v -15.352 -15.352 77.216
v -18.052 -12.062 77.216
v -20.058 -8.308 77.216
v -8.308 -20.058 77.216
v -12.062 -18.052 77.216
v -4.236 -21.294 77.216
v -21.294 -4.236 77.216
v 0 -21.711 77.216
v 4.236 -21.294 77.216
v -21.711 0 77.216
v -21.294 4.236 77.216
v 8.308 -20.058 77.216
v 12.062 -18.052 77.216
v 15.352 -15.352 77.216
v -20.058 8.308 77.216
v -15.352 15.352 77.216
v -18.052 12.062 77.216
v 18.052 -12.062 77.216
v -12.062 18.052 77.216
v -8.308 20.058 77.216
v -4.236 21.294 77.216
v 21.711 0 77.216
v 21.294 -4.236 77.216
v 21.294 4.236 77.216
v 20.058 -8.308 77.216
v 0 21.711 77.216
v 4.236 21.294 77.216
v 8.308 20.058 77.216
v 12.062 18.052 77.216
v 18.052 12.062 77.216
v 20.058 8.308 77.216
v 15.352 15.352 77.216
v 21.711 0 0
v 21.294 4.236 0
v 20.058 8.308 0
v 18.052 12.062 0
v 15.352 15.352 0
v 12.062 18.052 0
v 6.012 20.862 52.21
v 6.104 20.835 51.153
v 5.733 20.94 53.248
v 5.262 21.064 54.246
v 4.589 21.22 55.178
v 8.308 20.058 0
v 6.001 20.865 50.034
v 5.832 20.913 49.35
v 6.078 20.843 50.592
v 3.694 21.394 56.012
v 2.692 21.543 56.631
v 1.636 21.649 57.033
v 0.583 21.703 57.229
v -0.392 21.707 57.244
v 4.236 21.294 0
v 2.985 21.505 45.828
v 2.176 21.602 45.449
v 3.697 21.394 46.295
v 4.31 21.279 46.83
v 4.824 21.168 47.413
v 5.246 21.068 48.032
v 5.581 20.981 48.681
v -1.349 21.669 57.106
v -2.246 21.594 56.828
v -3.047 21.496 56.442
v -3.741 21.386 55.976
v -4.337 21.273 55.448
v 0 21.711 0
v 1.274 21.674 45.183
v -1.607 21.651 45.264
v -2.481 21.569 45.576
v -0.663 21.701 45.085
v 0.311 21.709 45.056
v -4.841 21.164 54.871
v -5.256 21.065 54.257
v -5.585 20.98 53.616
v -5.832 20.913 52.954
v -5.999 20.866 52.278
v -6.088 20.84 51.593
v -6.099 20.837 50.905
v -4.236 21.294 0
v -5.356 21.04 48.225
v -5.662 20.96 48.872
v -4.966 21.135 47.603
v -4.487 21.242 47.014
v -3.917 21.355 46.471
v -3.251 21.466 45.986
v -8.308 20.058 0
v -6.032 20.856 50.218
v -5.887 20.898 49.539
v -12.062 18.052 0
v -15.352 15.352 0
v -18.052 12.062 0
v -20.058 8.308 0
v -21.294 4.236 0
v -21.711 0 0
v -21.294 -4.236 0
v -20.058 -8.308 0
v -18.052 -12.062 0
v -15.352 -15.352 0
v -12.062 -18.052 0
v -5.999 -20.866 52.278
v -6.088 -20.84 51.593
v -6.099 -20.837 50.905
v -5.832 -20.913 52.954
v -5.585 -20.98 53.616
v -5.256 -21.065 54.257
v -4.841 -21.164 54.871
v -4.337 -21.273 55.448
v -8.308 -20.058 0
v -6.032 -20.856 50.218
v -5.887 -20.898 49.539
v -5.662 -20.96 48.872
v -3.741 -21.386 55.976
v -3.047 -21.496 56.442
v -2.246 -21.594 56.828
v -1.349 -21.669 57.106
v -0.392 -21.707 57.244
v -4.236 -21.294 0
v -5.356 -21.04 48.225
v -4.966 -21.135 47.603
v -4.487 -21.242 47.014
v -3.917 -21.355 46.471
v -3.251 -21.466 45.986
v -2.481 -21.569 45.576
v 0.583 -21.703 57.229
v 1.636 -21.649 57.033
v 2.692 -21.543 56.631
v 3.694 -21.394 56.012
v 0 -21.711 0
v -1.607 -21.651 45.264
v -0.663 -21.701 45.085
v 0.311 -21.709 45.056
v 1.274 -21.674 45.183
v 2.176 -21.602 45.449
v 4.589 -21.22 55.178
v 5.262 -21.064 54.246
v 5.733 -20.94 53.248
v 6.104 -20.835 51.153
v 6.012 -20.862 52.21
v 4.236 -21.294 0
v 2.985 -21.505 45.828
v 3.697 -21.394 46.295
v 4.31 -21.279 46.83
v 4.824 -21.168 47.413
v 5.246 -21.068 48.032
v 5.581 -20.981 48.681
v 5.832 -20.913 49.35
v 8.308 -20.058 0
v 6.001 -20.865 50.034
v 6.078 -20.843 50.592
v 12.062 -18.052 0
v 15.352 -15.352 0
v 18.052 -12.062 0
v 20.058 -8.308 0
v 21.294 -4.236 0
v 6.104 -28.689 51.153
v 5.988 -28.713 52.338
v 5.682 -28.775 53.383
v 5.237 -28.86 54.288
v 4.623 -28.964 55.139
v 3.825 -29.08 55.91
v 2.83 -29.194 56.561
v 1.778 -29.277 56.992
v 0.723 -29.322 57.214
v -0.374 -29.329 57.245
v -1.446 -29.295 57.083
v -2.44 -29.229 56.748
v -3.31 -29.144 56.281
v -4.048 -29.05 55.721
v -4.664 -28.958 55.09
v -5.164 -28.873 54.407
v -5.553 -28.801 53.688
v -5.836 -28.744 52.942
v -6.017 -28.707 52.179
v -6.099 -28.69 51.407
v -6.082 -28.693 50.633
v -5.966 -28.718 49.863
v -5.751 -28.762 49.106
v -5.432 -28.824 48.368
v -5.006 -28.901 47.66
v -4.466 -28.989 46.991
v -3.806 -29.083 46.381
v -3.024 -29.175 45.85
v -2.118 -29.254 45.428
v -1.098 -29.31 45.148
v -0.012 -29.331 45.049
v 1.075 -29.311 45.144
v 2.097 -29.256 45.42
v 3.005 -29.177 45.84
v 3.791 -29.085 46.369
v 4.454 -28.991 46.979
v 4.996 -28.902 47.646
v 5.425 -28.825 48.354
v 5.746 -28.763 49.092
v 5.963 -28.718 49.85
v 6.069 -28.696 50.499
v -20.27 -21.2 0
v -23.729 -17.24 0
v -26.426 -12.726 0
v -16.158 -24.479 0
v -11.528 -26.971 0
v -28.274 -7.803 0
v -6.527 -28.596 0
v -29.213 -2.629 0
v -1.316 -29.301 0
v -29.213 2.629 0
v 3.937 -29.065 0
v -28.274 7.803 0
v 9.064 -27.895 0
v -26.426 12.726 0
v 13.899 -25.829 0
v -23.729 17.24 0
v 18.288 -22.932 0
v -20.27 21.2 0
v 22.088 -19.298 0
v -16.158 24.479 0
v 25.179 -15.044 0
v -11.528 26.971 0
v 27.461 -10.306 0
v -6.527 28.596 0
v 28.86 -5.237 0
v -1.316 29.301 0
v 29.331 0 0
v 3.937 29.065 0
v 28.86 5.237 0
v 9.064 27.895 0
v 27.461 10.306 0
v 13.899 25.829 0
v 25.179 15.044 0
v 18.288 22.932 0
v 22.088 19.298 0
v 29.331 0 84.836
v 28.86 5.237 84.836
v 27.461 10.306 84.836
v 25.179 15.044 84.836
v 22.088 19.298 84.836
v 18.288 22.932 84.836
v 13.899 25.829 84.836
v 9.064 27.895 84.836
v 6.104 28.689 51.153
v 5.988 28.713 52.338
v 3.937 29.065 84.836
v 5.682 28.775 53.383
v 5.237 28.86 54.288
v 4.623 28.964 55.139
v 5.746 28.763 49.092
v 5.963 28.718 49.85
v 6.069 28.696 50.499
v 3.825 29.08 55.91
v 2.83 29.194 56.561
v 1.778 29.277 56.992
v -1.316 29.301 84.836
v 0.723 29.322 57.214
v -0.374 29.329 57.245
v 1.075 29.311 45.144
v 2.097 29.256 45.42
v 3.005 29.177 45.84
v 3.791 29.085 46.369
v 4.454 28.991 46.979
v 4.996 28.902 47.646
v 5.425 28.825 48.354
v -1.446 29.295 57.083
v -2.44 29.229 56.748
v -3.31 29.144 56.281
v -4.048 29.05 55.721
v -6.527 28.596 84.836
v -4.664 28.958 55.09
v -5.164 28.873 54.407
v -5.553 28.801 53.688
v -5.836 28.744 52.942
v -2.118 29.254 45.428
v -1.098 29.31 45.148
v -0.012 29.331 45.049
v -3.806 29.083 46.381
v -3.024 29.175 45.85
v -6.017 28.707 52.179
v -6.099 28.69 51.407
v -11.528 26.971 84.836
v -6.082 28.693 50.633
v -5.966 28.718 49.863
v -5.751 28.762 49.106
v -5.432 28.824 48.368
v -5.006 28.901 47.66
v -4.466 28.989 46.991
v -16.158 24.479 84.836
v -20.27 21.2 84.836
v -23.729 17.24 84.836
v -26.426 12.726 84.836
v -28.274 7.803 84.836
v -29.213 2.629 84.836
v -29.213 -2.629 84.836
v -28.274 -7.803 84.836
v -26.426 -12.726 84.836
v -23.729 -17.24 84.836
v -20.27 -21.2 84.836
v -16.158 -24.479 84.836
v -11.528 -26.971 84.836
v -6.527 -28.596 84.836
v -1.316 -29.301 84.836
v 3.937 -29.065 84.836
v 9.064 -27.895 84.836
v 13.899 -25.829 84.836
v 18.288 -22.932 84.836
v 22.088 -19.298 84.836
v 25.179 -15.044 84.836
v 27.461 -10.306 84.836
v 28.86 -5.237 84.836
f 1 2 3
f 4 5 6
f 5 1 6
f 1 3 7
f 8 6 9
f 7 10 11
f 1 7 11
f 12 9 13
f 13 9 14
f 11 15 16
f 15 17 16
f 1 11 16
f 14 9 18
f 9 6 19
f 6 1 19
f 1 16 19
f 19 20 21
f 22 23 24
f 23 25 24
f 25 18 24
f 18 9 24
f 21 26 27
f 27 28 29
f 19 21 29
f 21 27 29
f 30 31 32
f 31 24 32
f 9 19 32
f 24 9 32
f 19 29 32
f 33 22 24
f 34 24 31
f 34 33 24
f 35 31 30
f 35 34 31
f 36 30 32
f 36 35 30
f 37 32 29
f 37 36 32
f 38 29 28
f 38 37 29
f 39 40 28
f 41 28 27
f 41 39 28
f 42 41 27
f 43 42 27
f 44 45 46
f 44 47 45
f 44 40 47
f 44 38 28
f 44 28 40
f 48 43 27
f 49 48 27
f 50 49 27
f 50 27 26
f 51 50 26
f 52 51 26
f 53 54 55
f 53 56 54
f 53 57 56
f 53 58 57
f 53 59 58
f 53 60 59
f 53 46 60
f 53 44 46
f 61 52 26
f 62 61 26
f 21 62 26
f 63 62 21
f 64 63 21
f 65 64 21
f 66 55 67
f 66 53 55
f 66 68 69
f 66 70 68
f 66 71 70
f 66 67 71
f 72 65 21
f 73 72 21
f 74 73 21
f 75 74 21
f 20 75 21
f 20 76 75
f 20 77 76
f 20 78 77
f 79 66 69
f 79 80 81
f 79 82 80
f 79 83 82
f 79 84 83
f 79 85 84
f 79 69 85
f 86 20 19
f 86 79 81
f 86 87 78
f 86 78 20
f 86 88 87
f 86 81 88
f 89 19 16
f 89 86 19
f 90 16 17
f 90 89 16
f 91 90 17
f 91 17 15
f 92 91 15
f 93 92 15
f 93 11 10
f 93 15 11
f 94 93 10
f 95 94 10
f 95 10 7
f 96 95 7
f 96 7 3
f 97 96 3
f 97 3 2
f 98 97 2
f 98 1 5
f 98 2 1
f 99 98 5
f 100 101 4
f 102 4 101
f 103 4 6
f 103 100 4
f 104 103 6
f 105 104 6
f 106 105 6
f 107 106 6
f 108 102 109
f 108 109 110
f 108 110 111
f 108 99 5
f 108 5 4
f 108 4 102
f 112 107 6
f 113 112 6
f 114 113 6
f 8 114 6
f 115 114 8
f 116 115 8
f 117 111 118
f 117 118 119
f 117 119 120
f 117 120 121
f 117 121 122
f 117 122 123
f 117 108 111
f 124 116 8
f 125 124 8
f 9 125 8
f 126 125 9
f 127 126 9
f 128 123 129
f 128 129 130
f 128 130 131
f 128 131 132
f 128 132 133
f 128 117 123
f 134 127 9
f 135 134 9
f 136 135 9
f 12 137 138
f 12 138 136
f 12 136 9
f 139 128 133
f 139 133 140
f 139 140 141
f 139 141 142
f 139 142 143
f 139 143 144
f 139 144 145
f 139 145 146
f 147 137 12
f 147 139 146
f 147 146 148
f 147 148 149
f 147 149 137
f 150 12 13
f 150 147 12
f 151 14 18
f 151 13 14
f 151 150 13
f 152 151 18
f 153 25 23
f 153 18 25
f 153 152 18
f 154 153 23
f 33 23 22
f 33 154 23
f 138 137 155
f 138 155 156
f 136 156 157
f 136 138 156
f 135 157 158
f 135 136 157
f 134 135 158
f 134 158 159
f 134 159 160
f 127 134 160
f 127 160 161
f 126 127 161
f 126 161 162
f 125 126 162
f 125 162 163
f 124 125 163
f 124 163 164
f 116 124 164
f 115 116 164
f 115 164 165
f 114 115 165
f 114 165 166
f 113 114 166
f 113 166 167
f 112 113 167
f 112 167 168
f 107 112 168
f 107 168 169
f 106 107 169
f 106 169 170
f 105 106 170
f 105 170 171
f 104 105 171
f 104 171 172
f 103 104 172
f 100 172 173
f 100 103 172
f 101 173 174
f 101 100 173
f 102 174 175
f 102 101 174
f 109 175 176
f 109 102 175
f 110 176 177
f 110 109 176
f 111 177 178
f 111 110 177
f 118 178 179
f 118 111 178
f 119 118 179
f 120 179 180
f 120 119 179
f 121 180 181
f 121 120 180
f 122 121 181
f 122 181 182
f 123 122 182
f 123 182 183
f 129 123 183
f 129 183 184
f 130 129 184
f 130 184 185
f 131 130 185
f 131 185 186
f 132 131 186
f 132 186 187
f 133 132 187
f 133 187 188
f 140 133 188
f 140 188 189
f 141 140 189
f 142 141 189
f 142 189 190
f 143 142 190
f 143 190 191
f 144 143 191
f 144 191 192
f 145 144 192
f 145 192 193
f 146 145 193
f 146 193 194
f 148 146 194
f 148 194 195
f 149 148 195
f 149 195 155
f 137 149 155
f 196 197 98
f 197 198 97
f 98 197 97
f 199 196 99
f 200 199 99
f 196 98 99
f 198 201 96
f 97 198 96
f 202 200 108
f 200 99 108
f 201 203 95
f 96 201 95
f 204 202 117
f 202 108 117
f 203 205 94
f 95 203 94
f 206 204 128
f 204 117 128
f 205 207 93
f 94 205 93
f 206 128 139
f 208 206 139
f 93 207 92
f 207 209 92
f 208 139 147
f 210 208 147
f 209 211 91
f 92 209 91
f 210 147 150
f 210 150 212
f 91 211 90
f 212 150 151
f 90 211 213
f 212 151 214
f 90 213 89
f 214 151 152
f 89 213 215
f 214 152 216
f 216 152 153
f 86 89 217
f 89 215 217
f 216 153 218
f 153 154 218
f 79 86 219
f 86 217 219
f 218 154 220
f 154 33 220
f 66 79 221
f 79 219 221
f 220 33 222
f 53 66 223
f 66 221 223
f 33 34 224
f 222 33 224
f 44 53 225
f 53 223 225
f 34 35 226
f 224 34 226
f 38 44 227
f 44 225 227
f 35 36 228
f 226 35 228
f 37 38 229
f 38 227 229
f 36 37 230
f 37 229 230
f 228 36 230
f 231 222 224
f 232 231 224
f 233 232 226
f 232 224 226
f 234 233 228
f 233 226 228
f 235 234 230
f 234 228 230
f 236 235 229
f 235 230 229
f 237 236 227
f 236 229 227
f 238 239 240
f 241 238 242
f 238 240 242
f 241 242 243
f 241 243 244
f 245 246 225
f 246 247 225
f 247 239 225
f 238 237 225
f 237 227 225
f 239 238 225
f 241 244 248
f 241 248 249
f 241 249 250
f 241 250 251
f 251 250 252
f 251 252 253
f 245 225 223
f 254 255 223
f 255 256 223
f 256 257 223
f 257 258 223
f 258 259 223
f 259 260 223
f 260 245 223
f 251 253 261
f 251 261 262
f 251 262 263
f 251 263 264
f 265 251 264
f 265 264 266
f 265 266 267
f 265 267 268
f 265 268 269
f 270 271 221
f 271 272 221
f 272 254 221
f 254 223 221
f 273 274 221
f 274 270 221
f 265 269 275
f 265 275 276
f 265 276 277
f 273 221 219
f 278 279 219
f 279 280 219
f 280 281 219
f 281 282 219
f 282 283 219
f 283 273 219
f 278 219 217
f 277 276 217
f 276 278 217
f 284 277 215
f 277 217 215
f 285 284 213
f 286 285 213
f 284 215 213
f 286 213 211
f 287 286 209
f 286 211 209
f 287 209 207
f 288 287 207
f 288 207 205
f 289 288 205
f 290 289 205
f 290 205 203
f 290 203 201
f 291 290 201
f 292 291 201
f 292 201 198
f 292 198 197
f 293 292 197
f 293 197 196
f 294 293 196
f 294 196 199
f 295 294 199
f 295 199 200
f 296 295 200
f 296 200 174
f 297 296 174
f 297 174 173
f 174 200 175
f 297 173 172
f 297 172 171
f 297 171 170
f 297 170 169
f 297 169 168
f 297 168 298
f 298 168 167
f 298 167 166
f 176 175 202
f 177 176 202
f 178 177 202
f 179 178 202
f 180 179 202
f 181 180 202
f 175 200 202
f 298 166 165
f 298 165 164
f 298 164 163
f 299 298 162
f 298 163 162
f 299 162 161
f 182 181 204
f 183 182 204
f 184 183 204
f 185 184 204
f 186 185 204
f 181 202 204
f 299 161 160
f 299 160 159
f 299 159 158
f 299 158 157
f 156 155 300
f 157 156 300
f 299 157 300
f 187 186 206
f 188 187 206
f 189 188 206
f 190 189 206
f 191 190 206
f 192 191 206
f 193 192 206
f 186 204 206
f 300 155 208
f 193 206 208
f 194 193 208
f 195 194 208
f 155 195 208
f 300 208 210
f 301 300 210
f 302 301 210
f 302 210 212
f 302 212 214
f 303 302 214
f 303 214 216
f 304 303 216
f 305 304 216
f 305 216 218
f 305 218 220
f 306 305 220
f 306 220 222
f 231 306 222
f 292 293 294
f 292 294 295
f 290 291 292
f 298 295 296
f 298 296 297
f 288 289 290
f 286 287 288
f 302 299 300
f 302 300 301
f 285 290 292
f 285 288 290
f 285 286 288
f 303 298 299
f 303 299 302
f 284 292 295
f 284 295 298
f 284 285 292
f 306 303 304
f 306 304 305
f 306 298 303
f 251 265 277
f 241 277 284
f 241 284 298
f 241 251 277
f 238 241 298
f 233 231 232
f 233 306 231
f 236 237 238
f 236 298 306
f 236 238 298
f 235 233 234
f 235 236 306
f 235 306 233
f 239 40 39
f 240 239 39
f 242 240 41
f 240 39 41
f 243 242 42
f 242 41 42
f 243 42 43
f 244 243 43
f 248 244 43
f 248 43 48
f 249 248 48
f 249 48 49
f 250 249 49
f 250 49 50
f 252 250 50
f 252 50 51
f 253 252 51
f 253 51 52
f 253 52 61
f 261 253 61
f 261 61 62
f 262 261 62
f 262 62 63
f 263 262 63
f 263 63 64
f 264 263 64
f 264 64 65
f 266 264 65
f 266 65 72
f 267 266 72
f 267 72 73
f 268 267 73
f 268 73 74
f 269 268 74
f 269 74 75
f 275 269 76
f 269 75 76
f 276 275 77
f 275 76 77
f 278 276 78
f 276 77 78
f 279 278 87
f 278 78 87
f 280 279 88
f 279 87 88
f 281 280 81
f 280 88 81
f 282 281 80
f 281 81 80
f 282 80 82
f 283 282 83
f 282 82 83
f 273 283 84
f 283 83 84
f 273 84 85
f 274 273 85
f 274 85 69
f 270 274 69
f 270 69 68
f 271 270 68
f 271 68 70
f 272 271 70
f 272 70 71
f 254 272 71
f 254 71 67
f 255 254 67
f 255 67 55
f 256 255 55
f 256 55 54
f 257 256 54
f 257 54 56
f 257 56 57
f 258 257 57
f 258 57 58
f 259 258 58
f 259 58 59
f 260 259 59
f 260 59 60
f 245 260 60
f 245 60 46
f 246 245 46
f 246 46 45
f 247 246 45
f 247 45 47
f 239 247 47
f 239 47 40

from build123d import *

# Parameters (mm, degrees)
F0_R          = 29.3309291426
F1_DEPTH      = 84.836
F2_T          = -7.62
F3_R          = 6.1041032484
F4_DEPTH      = 29.3319291426
F4_DEPTH_BACK = 29.3319291426


with BuildPart() as f1:
    # F0 (on Top) → F1 (new body)
    with BuildSketch(Plane.XY):
        Circle(F0_R)
    extrude(amount=F1_DEPTH)

    # F2
    f2_openings = [f1.faces().sort_by_distance(p)[0] for p in [
        (0, 0, 0),
    ]]
    offset(amount=F2_T, openings=f2_openings)

    # F3 (on Front) → F4 (cut, two sides)
    with BuildSketch(Plane.XZ) as f4_sk:
        with Locations((0, 51.1526353657)):
            Circle(F3_R)
    extrude(amount=-F4_DEPTH, mode=Mode.SUBTRACT)
    extrude(f4_sk.sketch, amount=F4_DEPTH_BACK, mode=Mode.SUBTRACT)


solid = f1.part
